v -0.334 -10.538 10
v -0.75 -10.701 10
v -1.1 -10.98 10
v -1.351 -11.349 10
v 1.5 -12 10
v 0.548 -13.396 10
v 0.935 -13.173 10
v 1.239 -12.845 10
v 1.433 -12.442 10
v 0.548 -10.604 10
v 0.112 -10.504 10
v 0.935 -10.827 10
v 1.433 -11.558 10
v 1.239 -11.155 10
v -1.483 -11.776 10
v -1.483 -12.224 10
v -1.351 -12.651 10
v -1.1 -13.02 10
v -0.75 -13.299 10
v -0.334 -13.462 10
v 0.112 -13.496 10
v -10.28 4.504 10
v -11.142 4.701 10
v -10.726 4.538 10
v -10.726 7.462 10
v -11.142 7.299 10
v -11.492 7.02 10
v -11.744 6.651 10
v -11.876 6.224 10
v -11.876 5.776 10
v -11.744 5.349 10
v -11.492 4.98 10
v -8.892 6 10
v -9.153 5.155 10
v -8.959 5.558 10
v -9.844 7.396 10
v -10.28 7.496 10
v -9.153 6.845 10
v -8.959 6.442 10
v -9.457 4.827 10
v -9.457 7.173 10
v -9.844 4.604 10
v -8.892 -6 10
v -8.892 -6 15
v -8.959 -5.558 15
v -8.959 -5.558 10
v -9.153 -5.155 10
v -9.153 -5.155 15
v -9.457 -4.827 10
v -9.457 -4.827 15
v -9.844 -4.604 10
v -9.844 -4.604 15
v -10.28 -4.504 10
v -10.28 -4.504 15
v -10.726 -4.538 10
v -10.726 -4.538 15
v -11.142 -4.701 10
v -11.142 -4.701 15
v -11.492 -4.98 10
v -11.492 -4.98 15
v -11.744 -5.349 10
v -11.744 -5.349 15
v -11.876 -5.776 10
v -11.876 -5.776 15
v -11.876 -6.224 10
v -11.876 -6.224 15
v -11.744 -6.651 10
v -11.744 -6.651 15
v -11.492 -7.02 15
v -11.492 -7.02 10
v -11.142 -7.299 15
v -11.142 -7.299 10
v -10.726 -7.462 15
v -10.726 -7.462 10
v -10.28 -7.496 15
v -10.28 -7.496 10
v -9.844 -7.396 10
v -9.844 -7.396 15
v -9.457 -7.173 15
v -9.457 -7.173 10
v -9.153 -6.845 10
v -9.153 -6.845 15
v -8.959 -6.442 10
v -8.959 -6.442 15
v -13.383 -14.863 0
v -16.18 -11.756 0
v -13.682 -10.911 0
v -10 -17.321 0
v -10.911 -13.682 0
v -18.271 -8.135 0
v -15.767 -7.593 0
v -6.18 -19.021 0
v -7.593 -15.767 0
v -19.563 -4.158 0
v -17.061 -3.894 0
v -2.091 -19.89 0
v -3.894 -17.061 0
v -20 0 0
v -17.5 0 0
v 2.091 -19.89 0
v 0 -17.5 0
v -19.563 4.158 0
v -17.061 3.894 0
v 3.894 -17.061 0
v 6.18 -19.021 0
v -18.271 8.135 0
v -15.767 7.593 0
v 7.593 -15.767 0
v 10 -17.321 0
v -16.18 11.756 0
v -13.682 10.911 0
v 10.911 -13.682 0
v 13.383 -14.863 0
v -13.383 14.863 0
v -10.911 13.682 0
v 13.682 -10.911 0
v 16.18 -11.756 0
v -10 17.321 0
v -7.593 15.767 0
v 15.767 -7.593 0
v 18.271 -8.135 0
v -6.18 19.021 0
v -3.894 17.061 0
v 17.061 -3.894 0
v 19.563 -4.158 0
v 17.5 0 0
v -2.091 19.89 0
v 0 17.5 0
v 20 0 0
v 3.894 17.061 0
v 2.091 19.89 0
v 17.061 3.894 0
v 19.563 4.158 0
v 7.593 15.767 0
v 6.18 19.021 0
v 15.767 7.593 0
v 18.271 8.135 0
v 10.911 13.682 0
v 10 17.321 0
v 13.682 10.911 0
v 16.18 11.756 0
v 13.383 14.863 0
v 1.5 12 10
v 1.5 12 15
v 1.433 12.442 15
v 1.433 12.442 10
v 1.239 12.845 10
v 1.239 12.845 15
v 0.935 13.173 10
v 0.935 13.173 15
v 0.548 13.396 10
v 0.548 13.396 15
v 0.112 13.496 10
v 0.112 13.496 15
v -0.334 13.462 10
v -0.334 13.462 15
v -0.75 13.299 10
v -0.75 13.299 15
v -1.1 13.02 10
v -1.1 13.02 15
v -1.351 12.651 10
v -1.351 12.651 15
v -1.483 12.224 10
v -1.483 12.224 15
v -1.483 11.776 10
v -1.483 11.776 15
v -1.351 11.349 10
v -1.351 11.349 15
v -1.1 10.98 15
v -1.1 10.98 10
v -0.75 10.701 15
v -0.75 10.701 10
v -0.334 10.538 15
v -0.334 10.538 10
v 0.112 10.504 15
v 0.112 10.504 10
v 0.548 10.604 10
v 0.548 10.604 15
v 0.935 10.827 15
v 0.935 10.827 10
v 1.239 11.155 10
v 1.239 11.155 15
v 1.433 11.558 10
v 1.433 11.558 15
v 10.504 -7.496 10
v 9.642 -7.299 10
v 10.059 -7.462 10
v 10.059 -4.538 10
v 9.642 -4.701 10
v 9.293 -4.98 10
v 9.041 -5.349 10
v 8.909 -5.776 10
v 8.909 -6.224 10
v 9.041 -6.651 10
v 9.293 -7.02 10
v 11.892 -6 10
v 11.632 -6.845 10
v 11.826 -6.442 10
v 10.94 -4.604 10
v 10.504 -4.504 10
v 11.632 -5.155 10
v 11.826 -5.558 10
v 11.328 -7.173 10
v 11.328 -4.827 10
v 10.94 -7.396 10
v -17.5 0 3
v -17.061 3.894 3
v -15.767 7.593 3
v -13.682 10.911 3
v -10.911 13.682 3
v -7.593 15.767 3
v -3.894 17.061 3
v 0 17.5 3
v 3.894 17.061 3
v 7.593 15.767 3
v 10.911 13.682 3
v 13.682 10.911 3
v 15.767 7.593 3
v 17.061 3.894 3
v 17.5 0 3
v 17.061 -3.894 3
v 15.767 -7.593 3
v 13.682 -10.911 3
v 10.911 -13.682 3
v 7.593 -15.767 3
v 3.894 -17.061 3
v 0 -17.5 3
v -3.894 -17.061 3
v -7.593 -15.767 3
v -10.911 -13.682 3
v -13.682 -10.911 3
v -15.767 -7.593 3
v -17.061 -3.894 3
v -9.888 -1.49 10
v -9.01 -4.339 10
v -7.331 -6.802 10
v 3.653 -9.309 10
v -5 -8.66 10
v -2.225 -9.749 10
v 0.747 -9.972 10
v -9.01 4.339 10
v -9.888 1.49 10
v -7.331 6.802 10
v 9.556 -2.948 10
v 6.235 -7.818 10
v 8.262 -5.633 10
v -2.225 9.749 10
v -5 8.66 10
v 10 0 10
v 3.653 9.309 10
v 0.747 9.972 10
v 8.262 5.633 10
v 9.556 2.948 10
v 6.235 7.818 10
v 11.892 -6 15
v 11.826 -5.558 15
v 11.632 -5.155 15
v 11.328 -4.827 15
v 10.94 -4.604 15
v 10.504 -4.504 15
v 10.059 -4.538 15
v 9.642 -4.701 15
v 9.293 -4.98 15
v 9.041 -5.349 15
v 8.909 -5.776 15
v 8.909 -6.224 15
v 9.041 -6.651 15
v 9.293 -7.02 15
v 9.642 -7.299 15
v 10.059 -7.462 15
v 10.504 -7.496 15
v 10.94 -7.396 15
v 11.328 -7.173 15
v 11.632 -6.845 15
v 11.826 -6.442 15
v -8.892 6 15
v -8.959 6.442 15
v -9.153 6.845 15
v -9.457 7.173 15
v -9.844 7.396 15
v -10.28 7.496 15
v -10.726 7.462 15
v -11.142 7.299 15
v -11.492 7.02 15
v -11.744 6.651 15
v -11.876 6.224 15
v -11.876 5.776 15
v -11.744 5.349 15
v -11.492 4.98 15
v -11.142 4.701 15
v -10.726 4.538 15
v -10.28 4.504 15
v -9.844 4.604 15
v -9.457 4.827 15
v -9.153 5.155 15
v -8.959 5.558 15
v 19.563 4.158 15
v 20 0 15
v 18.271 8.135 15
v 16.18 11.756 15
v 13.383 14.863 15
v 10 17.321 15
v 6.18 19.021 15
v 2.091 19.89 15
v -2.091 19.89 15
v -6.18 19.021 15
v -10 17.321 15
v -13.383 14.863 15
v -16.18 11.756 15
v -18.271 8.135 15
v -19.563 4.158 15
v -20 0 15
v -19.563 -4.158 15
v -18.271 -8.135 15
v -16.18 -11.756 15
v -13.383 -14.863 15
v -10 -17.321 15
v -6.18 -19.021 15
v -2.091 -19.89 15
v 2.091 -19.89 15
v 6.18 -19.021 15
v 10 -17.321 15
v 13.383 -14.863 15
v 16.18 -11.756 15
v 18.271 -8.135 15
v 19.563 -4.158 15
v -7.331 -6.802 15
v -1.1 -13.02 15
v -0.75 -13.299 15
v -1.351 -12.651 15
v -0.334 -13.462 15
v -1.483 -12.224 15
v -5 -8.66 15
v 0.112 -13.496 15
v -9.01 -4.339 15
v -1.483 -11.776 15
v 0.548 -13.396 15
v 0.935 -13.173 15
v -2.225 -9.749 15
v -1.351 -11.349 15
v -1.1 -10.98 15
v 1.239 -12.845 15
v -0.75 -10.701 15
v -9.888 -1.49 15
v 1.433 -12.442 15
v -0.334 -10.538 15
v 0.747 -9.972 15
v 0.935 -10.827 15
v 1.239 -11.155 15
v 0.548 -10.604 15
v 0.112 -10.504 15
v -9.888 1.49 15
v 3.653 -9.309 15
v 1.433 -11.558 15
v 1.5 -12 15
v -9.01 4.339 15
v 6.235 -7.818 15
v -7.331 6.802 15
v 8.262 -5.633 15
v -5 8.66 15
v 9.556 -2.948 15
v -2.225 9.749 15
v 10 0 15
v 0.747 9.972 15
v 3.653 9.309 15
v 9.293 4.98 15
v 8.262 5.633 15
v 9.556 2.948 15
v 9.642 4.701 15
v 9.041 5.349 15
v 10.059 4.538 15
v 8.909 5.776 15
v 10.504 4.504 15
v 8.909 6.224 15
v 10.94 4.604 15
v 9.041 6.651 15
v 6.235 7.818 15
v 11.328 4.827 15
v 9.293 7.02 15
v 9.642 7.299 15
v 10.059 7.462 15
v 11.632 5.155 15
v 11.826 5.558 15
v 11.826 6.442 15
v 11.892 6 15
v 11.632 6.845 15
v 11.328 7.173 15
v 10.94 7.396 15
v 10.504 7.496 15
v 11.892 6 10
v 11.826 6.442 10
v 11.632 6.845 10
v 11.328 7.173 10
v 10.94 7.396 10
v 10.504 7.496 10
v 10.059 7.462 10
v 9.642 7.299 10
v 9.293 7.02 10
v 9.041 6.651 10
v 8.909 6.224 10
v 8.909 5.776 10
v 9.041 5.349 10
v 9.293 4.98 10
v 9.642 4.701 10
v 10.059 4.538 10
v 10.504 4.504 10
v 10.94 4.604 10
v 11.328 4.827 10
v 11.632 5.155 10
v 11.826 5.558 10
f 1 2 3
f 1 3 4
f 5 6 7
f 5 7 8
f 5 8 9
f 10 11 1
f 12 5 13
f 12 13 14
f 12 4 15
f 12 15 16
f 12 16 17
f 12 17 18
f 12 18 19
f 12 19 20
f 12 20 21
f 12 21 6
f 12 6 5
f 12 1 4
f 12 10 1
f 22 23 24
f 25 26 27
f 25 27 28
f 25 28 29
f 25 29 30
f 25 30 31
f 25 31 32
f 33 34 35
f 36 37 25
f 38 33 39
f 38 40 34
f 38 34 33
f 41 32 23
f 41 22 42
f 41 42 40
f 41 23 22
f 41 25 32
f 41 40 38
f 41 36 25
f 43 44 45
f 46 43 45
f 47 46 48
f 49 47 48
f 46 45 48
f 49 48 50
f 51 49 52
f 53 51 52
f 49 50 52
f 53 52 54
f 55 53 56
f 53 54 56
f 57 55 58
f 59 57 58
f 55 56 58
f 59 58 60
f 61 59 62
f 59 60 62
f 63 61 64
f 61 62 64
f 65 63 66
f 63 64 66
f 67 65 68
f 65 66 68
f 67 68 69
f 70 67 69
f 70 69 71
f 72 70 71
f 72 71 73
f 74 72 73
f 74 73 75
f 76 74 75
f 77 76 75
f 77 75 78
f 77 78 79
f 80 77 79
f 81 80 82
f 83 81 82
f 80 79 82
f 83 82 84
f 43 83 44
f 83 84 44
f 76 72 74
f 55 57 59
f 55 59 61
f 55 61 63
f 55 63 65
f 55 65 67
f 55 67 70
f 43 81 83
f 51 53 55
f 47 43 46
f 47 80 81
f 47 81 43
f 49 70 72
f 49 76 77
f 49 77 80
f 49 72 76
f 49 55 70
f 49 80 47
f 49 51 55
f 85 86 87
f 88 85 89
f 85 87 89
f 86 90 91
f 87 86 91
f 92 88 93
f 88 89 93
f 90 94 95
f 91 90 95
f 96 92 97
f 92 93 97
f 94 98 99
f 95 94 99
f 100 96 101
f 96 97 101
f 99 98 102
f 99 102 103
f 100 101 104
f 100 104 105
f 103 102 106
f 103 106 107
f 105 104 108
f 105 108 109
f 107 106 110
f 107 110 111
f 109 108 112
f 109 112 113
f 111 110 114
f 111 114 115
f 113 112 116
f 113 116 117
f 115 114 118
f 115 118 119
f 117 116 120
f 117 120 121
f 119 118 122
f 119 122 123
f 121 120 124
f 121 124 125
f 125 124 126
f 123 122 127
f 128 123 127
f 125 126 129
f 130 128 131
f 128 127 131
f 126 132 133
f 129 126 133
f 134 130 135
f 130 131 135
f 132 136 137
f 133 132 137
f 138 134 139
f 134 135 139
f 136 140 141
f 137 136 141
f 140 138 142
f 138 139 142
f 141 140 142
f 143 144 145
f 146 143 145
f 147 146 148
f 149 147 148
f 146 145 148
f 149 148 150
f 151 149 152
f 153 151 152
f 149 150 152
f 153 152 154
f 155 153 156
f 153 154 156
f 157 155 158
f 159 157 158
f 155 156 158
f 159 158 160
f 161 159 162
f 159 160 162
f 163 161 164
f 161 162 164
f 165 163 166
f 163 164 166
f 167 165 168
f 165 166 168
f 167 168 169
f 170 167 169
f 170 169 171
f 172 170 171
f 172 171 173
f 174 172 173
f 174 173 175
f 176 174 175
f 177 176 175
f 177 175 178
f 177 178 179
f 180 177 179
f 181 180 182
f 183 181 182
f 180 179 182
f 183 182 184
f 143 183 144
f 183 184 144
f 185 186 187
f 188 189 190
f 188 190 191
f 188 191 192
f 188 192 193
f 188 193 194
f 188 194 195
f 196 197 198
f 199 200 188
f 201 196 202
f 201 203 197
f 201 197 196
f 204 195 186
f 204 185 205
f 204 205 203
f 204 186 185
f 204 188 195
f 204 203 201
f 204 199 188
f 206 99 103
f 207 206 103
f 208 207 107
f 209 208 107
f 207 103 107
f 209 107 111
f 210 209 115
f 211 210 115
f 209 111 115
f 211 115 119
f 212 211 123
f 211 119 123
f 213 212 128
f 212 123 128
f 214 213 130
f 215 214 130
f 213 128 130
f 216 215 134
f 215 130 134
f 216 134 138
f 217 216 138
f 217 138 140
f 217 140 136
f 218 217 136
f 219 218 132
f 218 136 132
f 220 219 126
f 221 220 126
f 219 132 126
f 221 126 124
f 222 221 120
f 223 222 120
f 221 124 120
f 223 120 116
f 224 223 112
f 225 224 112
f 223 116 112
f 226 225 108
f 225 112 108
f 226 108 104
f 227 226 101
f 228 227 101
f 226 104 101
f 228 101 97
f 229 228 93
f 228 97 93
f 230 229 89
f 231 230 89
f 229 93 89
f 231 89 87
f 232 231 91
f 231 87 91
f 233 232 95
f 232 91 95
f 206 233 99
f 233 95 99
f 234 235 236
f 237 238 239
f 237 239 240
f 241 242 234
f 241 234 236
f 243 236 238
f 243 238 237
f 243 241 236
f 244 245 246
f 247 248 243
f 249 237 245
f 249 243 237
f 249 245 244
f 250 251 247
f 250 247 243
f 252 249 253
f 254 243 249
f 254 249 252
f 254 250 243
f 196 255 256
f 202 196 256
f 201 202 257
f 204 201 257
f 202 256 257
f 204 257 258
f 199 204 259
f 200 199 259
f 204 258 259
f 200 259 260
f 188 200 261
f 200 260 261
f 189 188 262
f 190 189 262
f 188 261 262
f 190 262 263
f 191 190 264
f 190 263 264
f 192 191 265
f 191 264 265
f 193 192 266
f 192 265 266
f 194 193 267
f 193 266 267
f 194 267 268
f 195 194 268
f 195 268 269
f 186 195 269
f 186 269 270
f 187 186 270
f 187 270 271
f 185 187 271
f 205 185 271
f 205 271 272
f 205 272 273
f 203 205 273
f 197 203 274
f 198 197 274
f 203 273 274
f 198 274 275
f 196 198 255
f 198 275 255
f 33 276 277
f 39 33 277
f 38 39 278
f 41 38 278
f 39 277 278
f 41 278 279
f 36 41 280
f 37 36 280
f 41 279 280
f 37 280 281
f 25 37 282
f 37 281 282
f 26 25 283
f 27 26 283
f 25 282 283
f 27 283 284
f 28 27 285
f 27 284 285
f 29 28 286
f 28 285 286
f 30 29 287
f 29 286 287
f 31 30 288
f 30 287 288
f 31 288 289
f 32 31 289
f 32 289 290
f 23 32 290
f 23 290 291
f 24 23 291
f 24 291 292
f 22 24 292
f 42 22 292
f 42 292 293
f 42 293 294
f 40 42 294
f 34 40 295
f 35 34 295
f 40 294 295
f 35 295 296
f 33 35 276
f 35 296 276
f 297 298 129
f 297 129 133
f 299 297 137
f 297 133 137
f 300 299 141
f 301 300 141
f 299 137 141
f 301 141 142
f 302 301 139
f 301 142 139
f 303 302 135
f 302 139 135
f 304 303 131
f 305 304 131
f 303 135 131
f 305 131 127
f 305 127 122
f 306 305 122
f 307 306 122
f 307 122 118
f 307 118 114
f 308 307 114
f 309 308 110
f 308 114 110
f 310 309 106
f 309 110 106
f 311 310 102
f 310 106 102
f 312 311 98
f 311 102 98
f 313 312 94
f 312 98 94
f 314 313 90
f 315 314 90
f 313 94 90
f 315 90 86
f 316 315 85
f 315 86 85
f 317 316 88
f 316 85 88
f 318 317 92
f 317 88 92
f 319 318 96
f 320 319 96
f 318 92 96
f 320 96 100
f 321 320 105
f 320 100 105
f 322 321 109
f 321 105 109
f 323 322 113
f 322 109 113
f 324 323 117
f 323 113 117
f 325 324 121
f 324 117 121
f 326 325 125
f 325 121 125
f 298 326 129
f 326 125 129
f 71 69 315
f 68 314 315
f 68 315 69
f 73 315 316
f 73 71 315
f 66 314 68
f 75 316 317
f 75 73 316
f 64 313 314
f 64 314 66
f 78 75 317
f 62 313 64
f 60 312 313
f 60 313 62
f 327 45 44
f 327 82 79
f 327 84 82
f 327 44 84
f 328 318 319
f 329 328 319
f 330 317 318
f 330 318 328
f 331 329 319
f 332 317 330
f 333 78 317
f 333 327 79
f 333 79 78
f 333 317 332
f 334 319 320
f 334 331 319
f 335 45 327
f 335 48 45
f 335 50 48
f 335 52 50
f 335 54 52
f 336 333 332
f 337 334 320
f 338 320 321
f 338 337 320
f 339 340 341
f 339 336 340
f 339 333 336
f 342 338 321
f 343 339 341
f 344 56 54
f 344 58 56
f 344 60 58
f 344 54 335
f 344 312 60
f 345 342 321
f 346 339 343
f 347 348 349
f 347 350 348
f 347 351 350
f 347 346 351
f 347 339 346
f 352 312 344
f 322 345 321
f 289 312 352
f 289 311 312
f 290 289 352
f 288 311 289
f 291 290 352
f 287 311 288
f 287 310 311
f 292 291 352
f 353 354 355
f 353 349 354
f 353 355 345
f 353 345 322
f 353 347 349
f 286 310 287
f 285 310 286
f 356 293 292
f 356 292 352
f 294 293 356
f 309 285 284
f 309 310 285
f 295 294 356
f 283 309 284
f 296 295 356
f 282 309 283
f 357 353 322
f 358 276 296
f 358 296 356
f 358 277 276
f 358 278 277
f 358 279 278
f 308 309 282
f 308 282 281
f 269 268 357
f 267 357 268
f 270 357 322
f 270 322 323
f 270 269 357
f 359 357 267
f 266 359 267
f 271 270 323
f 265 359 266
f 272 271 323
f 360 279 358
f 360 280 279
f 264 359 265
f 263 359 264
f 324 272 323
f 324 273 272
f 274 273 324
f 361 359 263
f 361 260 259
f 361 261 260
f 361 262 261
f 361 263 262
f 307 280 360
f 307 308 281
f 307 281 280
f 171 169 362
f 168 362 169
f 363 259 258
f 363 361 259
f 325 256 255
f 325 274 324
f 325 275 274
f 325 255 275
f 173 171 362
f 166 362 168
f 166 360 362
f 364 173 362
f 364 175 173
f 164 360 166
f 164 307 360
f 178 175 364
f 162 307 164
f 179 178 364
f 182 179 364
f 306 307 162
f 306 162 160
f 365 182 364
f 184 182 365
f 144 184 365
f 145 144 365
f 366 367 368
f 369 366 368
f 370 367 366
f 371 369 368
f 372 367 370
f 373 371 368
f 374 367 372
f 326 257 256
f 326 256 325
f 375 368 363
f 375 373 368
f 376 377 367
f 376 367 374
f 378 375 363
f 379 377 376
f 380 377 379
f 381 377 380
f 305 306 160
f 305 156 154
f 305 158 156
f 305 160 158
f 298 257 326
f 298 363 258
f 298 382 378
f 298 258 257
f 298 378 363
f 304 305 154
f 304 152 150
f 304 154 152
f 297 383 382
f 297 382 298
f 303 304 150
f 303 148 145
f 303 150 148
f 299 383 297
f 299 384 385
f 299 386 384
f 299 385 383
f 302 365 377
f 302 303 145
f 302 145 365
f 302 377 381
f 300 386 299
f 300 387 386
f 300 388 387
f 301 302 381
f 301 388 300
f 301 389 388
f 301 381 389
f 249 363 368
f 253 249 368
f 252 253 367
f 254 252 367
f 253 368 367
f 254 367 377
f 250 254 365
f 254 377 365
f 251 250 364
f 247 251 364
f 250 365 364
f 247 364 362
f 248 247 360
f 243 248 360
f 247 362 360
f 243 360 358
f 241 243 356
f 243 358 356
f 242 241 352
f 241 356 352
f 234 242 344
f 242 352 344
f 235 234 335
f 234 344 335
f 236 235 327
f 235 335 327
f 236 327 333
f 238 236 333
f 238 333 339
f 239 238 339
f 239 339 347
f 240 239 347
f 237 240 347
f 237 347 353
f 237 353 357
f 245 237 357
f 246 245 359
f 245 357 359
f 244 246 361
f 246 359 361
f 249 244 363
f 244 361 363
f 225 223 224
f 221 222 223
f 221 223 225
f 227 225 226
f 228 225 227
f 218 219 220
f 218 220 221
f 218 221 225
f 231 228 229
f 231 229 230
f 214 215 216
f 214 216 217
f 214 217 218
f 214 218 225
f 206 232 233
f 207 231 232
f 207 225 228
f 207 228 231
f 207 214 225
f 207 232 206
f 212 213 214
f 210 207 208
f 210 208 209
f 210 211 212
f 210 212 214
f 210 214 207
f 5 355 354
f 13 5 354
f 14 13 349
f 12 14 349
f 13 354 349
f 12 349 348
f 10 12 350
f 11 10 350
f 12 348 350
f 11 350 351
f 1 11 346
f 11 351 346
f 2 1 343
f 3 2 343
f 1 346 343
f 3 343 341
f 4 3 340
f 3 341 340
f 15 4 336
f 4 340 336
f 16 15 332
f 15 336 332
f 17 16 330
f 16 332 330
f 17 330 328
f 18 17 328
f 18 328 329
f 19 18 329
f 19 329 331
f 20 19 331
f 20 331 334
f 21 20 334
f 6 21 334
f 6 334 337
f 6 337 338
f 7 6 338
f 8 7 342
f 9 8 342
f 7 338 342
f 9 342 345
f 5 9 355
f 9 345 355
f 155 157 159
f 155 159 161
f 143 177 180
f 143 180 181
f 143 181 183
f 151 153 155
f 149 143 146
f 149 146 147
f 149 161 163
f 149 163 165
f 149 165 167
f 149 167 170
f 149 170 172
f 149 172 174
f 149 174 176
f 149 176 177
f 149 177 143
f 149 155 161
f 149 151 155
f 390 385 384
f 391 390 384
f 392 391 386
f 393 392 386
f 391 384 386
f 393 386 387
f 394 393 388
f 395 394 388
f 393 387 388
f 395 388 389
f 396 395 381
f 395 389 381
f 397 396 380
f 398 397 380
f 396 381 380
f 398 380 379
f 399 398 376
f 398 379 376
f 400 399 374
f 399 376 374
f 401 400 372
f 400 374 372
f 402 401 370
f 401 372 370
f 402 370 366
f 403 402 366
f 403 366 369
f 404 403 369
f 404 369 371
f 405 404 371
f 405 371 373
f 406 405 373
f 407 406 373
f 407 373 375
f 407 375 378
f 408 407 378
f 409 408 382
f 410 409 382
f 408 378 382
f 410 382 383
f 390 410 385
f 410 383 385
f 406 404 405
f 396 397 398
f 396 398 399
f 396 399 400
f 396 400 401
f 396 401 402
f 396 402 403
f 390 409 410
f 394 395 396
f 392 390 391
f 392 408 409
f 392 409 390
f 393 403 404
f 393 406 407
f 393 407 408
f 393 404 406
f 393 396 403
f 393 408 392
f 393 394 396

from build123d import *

# Parameters (mm, degrees)
SKETCH1_R           = 20
BOSS_EXTRUDE1_DEPTH = 15
SKETCH2_R           = 10
CUT_EXTRUDE1_DEPTH  = 5
SKETCH7_R           = 17.5
CUT_EXTRUDE2_DEPTH  = 3
SKETCH8_R           = 1.5
CUT_EXTRUDE3_DEPTH  = 5


with BuildPart() as part:
    # Sketch1 → Boss-Extrude1 (new body)
    with BuildSketch(Plane.XY):
        Circle(SKETCH1_R)
    extrude(amount=BOSS_EXTRUDE1_DEPTH)

    # Sketch2 → Cut-Extrude1 (cut)
    with BuildSketch(Plane.XY.offset(15)):
        Circle(SKETCH2_R)
    extrude(amount=-CUT_EXTRUDE1_DEPTH, mode=Mode.SUBTRACT)

    # Sketch7 → Cut-Extrude2 (cut)
    with BuildSketch(Plane(origin=(0, 0, 0), x_dir=(-1, 0, 0), z_dir=(0, 0, -1))):
        Circle(SKETCH7_R)
    extrude(amount=-CUT_EXTRUDE2_DEPTH, mode=Mode.SUBTRACT)

    # Sketch8 → Cut-Extrude3 (cut)
    with BuildSketch(Plane.XY.offset(15)):
        with Locations((0, 12)):
            Circle(SKETCH8_R)
        with Locations((10.392304845, 6)):
            Circle(SKETCH8_R)
        with Locations((10.392304845, -6)):
            Circle(SKETCH8_R)
        with Locations((0, -12)):
            Circle(SKETCH8_R)
        with Locations((-10.392304845, -6)):
            Circle(SKETCH8_R)
        with Locations((-10.392304845, 6)):
            Circle(SKETCH8_R)
    extrude(amount=-CUT_EXTRUDE3_DEPTH, mode=Mode.SUBTRACT)


solid = part.part
